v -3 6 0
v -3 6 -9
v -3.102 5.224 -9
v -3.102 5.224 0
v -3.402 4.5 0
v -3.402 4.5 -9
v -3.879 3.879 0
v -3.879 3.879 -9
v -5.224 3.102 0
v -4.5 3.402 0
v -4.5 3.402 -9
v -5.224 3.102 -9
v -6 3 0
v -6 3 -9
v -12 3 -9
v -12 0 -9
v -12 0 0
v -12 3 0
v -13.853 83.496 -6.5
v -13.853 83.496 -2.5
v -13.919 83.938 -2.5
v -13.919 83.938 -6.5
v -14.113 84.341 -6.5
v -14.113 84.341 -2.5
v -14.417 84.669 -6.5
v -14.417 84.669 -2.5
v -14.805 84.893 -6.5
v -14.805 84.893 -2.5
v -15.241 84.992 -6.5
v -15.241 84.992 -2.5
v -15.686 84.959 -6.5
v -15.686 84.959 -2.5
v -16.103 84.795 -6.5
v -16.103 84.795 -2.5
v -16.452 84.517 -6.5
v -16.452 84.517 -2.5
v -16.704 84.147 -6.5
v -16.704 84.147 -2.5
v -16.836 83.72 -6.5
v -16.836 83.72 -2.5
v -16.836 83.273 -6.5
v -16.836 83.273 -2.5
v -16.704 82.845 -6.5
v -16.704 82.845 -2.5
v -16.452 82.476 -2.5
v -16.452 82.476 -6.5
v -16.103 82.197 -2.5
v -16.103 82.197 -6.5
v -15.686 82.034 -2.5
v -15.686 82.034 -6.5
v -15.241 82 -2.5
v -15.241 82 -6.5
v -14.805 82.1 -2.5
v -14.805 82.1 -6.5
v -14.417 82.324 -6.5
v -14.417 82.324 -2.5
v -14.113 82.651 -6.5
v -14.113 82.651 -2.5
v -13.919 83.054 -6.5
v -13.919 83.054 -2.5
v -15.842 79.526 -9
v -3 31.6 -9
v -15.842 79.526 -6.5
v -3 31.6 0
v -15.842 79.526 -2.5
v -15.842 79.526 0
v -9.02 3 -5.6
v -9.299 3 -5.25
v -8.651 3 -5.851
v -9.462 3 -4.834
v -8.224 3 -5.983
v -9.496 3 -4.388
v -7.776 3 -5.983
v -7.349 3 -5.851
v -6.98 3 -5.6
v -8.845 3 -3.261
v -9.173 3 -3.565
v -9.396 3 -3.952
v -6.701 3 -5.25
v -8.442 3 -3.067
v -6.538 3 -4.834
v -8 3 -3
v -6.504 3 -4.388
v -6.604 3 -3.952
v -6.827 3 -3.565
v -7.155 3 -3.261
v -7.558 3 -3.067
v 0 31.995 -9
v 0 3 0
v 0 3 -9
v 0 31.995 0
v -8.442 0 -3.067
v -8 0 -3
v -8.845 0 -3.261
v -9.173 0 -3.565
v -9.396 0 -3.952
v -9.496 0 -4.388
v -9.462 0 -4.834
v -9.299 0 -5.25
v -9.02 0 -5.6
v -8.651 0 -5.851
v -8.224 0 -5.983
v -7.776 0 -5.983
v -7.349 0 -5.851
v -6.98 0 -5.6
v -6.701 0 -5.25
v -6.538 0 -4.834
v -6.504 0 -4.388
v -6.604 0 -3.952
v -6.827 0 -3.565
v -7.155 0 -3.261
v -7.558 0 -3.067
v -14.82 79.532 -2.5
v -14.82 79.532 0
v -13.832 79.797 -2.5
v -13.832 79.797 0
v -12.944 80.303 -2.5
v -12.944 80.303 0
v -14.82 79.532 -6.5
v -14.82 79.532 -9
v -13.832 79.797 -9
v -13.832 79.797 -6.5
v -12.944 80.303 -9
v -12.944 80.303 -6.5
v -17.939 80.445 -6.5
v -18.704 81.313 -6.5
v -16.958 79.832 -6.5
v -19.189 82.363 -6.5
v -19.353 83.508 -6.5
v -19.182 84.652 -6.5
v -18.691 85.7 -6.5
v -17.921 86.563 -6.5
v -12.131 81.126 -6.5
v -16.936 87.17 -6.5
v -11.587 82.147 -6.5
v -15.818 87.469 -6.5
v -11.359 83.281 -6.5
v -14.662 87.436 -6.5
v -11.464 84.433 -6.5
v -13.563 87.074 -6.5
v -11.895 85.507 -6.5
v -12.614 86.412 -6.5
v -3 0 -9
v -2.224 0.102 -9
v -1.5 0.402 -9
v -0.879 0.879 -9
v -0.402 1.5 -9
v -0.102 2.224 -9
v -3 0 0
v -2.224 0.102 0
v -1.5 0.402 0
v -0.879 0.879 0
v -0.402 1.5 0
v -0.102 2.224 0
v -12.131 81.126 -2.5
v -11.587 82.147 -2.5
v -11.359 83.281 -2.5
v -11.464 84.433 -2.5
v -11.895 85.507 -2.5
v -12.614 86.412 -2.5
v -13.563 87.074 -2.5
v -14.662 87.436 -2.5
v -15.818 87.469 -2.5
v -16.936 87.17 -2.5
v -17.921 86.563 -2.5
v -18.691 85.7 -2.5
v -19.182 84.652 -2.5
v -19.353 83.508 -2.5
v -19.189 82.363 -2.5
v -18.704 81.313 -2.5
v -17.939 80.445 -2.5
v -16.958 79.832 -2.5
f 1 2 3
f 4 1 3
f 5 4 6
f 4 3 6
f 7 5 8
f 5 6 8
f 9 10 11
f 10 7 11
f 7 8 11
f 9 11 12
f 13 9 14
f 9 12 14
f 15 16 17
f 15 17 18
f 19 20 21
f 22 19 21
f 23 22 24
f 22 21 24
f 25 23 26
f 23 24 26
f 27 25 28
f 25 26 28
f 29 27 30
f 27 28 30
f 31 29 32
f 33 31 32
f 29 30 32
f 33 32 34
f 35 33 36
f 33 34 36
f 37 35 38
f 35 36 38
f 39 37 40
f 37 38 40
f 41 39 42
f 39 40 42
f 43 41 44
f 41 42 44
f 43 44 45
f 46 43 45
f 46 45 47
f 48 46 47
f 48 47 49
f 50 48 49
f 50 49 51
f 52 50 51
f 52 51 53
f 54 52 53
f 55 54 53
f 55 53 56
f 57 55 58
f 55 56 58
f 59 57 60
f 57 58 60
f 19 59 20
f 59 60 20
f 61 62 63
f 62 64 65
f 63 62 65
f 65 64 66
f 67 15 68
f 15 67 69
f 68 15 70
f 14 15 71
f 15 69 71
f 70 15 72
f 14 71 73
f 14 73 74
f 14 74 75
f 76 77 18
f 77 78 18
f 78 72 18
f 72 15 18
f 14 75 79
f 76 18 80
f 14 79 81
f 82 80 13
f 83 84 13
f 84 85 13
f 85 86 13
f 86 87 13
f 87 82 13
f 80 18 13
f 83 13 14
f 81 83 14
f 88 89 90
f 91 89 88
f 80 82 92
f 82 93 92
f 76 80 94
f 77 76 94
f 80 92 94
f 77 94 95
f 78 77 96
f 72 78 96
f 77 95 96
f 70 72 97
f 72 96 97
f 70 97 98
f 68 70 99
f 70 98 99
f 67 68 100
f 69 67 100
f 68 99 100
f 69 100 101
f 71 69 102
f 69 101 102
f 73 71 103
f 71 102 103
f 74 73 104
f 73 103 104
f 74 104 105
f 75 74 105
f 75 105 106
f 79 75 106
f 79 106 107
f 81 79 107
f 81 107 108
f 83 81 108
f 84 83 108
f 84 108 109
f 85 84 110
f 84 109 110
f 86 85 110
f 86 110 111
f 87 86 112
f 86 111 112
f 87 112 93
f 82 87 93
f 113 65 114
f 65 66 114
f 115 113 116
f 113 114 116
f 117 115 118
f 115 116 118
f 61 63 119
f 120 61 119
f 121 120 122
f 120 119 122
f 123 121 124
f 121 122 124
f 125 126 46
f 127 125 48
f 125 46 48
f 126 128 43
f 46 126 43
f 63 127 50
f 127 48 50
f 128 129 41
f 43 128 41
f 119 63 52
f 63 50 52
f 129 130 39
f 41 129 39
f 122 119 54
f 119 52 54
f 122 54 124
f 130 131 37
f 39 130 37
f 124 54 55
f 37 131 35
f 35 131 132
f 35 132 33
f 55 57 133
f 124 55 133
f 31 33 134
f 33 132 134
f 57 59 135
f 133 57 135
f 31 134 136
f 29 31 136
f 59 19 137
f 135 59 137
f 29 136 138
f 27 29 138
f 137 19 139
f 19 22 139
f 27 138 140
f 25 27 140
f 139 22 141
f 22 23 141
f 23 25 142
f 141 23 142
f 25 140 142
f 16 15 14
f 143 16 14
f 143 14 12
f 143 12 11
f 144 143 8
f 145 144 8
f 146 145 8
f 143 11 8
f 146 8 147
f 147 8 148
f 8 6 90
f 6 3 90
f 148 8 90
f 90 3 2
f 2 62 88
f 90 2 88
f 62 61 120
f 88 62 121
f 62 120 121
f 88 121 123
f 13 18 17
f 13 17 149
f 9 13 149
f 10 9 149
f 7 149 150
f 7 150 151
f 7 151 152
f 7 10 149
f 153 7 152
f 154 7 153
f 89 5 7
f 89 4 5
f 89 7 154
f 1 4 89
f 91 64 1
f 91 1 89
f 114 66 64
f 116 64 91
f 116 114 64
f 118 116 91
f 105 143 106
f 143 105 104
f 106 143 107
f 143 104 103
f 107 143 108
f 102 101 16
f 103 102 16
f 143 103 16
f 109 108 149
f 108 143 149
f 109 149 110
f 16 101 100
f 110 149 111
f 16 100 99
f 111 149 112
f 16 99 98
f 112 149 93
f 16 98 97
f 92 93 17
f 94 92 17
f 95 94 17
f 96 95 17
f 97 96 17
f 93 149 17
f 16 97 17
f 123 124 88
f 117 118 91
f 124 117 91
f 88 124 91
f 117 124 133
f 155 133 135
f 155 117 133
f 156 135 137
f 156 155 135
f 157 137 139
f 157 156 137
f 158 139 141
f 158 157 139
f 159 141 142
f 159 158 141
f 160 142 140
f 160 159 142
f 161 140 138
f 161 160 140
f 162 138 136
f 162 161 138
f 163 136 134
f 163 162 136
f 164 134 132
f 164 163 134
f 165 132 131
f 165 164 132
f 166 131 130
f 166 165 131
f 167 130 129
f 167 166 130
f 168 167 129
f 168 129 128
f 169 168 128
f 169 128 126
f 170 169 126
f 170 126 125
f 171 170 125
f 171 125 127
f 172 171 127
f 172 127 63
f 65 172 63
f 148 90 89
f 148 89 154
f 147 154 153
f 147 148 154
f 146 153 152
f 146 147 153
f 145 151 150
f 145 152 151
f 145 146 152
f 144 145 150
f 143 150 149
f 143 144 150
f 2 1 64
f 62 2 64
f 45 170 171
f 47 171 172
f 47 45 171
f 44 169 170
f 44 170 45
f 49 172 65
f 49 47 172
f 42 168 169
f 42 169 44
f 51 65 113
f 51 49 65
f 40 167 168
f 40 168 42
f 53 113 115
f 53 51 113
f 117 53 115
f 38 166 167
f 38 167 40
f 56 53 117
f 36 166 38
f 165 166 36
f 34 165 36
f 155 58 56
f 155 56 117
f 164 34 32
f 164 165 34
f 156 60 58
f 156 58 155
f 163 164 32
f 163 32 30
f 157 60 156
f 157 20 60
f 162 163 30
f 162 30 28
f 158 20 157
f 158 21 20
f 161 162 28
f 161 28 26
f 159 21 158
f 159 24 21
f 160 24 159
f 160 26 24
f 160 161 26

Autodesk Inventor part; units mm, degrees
ref_plane "YZ Plane" through (0, 0, 0) normal (1, 0, 0) x (0, 1, 0)
ref_plane "XZ Plane" through (0, 0, 0) normal (0, 1, 0) x (-1, 0, 0)
ref_plane "XY Plane" through (0, 0, 0) normal (0, 0, 1) x (1, 0, 0)
sketch "Sketch1" plane through (0, 0, 0) normal (0, 0, 1) x (1, 0, 0)
  line L0 (0, 0) -> (0, 31.995)
  line L1 (0, 0) -> (-12, 0)
  line L2 (-12, 0) -> (-12, 3)
  line L3 (-12, 3) -> (-3, 3)
  line L4 (-3, 3) -> (-3, 31.6)
  line L5 (-3, 31.6) -> (-15.941, 79.8963)
  line L6 (-12.944, 80.3028) -> (0, 31.995)
  circle A0 centre (-15.3527, 83.4963) radius 4
  circle A1 centre (-15.3527, 83.4963) radius 1.5
  point P0 (-15.8418, 79.5263)
  dimension "d31" = 8
  dimension "d1" = 3
  dimension "d2" = 3
  dimension "d3" = 9
  dimension "d4" = 28.6
  dimension "d27" = 165
  dimension "d28" = 3
  dimension "d29" = 50
  dimension "d32" = 1.5
  dimension "d34" = 3.6
  dimension "d35" = 3
extrude "Extrusion4" add sketch "Sketch1" against normal blind 9 contours L1 L2 L3 L4 L5 A0 L6 L0
extrude "Extrusion5" add sketch "Sketch1" against normal blind 6.5 contours A0
extrude "Extrusion6" cut sketch "Sketch1" against normal blind 2.5 contours A0
sketch "Sketch3" plane through (-12, 3, 0) normal (0, 1, 0) x (1, 0, 0)
  line L0 (0, 0) -> (12, 0) projected
  line L1 (0, 0) -> (0, 9) projected
  line L2 (12, 9) -> (0, 9) projected
  line L3 (12, 0) -> (12, 9) projected
  point P0 (4, 4.5)
  point P1 (0, 4.5)
  dimension "d42" = 4
  dimension "d43" = 4.5
hole "Hole2" at (-8, 3, -4.5) direction (0, -1, 0) diameter 3 end through all
fillet "Fillet2" radius 3 2 edges at (-3, 3, -4.5) (0, 0, -4.5)
properties part number "HUDSON-1-73A"
